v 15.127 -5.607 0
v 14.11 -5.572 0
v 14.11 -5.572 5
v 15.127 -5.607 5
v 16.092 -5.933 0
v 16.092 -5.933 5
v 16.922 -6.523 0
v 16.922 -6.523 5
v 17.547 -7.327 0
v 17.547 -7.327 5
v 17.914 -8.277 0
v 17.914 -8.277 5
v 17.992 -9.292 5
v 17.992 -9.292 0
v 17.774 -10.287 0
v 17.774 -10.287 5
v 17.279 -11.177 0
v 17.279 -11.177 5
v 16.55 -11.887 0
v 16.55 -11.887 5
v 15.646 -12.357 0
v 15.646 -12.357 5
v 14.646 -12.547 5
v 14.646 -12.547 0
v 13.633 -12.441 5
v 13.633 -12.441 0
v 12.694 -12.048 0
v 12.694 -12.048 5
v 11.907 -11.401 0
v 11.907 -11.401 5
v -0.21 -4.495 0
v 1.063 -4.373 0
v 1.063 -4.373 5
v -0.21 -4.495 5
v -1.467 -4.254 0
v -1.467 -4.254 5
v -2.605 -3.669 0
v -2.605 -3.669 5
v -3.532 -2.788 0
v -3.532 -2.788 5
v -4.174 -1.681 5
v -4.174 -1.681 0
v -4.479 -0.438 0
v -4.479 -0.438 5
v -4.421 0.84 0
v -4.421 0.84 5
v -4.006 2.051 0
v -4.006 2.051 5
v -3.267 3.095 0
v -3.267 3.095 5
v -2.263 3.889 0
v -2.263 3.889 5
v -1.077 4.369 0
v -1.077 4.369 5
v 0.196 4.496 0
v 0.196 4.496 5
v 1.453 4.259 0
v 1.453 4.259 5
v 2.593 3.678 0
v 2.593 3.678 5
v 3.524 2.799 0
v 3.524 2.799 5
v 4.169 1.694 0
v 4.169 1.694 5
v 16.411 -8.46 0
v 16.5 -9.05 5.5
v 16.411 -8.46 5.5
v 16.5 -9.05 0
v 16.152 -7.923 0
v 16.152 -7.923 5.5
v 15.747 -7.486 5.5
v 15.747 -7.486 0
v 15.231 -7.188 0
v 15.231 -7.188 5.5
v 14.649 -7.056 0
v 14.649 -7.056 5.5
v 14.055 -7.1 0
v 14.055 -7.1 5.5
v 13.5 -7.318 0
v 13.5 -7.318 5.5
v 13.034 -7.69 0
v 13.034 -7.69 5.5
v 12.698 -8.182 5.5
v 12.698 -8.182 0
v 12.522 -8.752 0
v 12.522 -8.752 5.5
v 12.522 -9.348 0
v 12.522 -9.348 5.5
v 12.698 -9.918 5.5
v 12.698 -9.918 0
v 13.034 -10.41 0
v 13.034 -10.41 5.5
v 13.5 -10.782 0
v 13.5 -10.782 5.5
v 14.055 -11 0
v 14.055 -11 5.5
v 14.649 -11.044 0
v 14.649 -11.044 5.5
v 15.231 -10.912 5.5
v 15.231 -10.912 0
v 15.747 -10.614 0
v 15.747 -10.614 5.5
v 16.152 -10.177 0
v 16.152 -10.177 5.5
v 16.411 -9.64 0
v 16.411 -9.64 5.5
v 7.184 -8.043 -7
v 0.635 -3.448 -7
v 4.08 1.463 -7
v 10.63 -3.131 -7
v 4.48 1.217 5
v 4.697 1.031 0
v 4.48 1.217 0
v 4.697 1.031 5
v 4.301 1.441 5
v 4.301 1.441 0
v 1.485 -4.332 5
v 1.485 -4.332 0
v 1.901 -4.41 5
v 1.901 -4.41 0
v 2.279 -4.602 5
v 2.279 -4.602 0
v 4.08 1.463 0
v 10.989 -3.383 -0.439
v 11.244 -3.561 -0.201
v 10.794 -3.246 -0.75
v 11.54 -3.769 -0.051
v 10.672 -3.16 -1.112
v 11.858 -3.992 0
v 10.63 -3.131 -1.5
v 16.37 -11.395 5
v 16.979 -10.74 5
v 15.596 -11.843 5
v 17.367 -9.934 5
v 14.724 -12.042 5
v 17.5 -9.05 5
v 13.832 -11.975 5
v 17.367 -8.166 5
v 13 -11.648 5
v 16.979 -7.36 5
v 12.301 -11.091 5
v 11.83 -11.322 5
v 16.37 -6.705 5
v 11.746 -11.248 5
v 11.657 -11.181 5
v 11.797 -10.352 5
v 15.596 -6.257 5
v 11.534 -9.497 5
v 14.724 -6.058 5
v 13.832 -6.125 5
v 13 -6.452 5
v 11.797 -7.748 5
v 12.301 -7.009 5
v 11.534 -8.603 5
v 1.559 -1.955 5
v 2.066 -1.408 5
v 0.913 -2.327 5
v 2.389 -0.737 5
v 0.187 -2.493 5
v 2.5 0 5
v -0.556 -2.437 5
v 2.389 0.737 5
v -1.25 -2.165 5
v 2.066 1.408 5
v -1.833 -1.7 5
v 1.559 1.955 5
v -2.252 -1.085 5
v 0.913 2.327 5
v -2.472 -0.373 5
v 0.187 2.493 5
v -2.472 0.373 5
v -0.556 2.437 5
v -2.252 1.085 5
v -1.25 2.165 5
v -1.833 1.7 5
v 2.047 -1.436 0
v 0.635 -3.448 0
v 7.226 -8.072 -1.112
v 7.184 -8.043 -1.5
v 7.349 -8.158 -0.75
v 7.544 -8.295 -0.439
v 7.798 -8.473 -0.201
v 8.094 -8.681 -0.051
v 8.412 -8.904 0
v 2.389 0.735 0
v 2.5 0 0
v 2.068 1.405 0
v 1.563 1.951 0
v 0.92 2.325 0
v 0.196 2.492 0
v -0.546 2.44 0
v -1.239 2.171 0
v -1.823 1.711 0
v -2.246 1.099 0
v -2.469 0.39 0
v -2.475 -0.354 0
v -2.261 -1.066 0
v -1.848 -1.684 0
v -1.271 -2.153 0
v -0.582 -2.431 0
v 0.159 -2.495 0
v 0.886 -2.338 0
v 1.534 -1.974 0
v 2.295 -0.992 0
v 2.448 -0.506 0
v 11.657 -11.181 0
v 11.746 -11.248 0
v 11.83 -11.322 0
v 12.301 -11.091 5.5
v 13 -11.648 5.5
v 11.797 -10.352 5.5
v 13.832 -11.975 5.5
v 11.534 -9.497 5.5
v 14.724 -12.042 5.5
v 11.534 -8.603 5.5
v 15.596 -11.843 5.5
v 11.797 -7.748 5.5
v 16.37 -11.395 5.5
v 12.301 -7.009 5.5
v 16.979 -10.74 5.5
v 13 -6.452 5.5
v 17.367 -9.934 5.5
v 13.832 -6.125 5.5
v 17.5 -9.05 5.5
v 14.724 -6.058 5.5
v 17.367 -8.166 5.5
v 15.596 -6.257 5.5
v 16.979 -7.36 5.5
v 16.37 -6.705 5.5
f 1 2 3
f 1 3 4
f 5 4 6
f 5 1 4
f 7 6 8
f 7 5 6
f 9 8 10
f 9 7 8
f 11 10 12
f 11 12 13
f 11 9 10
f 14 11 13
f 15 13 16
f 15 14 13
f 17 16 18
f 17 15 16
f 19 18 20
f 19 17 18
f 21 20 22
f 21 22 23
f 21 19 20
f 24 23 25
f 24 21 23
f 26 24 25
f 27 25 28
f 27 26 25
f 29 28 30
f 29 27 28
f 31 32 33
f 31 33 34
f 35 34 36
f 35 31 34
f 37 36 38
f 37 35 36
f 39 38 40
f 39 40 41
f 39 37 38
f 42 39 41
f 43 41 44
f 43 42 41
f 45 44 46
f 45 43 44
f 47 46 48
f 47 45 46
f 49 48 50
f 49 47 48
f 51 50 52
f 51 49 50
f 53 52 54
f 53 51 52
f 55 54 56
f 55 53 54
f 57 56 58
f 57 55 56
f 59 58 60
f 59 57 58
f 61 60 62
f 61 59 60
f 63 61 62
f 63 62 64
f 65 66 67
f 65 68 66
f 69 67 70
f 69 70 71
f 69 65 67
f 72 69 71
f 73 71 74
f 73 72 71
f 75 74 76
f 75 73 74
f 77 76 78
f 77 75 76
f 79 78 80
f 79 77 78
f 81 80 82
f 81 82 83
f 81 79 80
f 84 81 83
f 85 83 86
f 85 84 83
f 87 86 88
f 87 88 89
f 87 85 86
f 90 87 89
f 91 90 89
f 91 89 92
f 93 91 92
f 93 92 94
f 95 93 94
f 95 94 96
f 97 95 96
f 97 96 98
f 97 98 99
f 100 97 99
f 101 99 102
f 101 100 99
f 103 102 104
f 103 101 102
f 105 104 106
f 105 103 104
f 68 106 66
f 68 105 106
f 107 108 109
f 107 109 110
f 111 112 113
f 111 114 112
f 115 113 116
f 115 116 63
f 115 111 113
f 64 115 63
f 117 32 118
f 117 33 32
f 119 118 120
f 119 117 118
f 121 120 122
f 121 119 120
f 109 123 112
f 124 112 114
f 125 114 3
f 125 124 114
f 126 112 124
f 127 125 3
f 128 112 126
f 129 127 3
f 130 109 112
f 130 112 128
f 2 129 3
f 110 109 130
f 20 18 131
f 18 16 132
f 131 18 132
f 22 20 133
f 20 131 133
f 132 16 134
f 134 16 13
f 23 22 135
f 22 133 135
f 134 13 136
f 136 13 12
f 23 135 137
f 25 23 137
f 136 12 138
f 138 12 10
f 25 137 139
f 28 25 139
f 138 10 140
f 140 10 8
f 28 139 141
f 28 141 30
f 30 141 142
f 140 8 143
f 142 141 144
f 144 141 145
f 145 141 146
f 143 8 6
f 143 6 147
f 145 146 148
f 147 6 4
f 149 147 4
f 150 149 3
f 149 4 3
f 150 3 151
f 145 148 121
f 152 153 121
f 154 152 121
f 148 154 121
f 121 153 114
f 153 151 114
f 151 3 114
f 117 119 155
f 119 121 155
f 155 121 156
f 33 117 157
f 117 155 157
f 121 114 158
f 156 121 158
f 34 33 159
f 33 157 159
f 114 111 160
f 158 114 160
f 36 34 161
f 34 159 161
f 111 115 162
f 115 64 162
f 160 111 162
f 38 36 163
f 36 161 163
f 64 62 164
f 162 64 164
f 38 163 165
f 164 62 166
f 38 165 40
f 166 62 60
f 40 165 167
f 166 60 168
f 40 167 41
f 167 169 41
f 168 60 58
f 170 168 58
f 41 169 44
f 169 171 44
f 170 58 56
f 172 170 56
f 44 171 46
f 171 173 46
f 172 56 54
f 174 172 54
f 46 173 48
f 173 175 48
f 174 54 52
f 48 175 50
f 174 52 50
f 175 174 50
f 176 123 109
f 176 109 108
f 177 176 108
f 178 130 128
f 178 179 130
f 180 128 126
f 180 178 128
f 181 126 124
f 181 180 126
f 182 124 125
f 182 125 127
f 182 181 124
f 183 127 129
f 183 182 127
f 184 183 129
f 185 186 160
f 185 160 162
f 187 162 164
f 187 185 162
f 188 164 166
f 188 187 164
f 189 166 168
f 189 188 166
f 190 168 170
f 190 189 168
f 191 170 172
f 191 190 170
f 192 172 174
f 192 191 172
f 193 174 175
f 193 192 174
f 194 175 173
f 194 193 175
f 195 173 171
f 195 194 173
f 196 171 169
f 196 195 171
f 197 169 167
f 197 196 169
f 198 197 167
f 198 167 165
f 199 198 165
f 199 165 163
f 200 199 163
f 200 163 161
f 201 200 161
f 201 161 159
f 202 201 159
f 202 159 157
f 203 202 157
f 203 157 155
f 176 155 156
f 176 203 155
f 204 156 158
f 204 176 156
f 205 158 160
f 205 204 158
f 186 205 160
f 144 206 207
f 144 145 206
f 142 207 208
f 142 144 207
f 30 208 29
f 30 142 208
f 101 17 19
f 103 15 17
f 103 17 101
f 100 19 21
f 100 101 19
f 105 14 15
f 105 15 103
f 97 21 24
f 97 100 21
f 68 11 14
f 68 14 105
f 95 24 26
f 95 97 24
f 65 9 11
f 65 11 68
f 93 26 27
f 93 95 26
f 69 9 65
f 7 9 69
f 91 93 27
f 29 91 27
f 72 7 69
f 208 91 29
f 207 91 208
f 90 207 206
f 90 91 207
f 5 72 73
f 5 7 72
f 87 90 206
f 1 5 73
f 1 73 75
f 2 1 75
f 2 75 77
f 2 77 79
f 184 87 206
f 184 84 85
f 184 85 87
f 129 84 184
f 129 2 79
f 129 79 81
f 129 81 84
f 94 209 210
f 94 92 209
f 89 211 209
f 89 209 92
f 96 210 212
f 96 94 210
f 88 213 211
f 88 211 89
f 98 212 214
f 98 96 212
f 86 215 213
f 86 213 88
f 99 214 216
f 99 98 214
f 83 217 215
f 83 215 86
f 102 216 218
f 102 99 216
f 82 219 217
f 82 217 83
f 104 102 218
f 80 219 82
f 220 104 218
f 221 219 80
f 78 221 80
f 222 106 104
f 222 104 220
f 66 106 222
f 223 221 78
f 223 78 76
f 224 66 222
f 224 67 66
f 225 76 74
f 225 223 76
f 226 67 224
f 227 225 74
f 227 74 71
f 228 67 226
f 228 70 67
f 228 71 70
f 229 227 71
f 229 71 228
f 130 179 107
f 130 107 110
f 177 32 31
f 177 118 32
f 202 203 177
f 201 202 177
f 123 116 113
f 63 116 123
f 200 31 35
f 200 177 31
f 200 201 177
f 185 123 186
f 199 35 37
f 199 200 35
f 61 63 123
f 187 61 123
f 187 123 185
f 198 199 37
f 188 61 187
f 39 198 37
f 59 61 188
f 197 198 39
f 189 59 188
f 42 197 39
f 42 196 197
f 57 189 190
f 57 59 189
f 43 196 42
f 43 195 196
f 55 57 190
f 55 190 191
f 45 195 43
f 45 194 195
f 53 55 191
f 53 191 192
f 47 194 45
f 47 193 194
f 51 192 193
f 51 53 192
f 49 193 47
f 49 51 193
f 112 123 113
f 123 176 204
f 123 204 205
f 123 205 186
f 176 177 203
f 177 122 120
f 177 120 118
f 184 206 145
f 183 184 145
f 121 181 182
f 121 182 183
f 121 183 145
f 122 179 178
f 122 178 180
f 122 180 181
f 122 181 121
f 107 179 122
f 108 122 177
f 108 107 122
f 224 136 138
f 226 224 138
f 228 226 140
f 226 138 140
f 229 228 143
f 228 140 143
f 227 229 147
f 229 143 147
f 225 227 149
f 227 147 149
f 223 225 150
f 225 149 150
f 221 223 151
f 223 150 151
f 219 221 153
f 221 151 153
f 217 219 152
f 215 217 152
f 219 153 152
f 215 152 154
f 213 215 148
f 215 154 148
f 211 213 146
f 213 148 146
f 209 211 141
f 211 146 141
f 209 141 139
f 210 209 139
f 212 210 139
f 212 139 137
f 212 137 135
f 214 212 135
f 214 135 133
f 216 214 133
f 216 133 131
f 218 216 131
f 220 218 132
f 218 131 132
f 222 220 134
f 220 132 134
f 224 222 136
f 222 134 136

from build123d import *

# Parameters (mm, degrees)
SKETCH_4_R           = 2.0000000000000924
SKETCH_4_R_2         = 2.5
EXTRUDE_1_DEPTH      = 5
EXTRUDE_2_DEPTH      = 7
EXTRUDE_2_DEPTH_BACK = 5
FILLET_3_R           = 1.5
FILLET_4_R           = 1.5
SKETCH_6_R           = 3.0000000000000897
SKETCH_6_R_2         = 2.0000000000000884
EXTRUDE_3_DEPTH      = 0.5


with BuildPart() as part:
    # 草图4 → 凸台-拉伸1 (new body)
    with BuildSketch(Plane.XY):
        with BuildLine():
            Line((4.306700056173786, 1.3047354621350271), (14.109660641900325, -5.571834508606824))
            ThreePointArc((14.109660641900325, -5.571834508606824), (17.74630975952625, -10.35823275650958), (11.807053976651485, -11.285630048852315))
            Line((11.807053976651485, -11.285630048852315), (1.6735833284293933, -4.177214244302438))
            ThreePointArc((1.6735833284293933, -4.177214244302438), (-4.056339542742652, 1.948360724810045), (4.306700056173786, 1.3047354621350271))
        make_face()
        with Locations((14.500000000000004, -9.05)):
            Circle(SKETCH_4_R, mode=Mode.SUBTRACT)
        Circle(SKETCH_4_R_2, mode=Mode.SUBTRACT)
    extrude(amount=EXTRUDE_1_DEPTH)

    # 草图5 → 凸台-拉伸2 (add, two sides: drawn at the far end of the back side and taken through both)
    with BuildSketch(Plane(origin=(0, 0, 0), x_dir=(-1, 0, 0), z_dir=(0, 0, -1)).offset(-EXTRUDE_2_DEPTH_BACK)):
        Polygon((-0.6347261790104263, -3.4484778778636556), (-7.184027973017892, -8.042674870920285), (-10.629675717810366, -3.130698525414685), (-4.080373923802897, 1.463498467641941), align=None)
    extrude(amount=EXTRUDE_2_DEPTH + EXTRUDE_2_DEPTH_BACK)

    # 圆角3
    fillet_3_edges = [part.edges().sort_by_distance(p)[0] for p in [
        (8.90685184541413, -5.586686698167485, 0),
        (4.306700056173785, 1.3047354621350273, 2.5),
    ]]
    fillet(fillet_3_edges, radius=FILLET_3_R)

    # 圆角4
    fillet_4_edges = [part.edges().sort_by_distance(p)[0] for p in [
        (11.807053976651485, -11.285630048852315, 2.5),
        (1.6735833284293933, -4.177214244302439, 2.5),
    ]]
    fillet(fillet_4_edges, radius=FILLET_4_R)

    # 草图6 → 凸台-拉伸3 (add)
    with BuildSketch(Plane.XY.offset(5)):
        with Locations((14.500000000000004, -9.05)):
            Circle(SKETCH_6_R)
        with Locations((14.500000000000004, -9.05)):
            Circle(SKETCH_6_R_2, mode=Mode.SUBTRACT)
    extrude(amount=EXTRUDE_3_DEPTH)


solid = part.part
